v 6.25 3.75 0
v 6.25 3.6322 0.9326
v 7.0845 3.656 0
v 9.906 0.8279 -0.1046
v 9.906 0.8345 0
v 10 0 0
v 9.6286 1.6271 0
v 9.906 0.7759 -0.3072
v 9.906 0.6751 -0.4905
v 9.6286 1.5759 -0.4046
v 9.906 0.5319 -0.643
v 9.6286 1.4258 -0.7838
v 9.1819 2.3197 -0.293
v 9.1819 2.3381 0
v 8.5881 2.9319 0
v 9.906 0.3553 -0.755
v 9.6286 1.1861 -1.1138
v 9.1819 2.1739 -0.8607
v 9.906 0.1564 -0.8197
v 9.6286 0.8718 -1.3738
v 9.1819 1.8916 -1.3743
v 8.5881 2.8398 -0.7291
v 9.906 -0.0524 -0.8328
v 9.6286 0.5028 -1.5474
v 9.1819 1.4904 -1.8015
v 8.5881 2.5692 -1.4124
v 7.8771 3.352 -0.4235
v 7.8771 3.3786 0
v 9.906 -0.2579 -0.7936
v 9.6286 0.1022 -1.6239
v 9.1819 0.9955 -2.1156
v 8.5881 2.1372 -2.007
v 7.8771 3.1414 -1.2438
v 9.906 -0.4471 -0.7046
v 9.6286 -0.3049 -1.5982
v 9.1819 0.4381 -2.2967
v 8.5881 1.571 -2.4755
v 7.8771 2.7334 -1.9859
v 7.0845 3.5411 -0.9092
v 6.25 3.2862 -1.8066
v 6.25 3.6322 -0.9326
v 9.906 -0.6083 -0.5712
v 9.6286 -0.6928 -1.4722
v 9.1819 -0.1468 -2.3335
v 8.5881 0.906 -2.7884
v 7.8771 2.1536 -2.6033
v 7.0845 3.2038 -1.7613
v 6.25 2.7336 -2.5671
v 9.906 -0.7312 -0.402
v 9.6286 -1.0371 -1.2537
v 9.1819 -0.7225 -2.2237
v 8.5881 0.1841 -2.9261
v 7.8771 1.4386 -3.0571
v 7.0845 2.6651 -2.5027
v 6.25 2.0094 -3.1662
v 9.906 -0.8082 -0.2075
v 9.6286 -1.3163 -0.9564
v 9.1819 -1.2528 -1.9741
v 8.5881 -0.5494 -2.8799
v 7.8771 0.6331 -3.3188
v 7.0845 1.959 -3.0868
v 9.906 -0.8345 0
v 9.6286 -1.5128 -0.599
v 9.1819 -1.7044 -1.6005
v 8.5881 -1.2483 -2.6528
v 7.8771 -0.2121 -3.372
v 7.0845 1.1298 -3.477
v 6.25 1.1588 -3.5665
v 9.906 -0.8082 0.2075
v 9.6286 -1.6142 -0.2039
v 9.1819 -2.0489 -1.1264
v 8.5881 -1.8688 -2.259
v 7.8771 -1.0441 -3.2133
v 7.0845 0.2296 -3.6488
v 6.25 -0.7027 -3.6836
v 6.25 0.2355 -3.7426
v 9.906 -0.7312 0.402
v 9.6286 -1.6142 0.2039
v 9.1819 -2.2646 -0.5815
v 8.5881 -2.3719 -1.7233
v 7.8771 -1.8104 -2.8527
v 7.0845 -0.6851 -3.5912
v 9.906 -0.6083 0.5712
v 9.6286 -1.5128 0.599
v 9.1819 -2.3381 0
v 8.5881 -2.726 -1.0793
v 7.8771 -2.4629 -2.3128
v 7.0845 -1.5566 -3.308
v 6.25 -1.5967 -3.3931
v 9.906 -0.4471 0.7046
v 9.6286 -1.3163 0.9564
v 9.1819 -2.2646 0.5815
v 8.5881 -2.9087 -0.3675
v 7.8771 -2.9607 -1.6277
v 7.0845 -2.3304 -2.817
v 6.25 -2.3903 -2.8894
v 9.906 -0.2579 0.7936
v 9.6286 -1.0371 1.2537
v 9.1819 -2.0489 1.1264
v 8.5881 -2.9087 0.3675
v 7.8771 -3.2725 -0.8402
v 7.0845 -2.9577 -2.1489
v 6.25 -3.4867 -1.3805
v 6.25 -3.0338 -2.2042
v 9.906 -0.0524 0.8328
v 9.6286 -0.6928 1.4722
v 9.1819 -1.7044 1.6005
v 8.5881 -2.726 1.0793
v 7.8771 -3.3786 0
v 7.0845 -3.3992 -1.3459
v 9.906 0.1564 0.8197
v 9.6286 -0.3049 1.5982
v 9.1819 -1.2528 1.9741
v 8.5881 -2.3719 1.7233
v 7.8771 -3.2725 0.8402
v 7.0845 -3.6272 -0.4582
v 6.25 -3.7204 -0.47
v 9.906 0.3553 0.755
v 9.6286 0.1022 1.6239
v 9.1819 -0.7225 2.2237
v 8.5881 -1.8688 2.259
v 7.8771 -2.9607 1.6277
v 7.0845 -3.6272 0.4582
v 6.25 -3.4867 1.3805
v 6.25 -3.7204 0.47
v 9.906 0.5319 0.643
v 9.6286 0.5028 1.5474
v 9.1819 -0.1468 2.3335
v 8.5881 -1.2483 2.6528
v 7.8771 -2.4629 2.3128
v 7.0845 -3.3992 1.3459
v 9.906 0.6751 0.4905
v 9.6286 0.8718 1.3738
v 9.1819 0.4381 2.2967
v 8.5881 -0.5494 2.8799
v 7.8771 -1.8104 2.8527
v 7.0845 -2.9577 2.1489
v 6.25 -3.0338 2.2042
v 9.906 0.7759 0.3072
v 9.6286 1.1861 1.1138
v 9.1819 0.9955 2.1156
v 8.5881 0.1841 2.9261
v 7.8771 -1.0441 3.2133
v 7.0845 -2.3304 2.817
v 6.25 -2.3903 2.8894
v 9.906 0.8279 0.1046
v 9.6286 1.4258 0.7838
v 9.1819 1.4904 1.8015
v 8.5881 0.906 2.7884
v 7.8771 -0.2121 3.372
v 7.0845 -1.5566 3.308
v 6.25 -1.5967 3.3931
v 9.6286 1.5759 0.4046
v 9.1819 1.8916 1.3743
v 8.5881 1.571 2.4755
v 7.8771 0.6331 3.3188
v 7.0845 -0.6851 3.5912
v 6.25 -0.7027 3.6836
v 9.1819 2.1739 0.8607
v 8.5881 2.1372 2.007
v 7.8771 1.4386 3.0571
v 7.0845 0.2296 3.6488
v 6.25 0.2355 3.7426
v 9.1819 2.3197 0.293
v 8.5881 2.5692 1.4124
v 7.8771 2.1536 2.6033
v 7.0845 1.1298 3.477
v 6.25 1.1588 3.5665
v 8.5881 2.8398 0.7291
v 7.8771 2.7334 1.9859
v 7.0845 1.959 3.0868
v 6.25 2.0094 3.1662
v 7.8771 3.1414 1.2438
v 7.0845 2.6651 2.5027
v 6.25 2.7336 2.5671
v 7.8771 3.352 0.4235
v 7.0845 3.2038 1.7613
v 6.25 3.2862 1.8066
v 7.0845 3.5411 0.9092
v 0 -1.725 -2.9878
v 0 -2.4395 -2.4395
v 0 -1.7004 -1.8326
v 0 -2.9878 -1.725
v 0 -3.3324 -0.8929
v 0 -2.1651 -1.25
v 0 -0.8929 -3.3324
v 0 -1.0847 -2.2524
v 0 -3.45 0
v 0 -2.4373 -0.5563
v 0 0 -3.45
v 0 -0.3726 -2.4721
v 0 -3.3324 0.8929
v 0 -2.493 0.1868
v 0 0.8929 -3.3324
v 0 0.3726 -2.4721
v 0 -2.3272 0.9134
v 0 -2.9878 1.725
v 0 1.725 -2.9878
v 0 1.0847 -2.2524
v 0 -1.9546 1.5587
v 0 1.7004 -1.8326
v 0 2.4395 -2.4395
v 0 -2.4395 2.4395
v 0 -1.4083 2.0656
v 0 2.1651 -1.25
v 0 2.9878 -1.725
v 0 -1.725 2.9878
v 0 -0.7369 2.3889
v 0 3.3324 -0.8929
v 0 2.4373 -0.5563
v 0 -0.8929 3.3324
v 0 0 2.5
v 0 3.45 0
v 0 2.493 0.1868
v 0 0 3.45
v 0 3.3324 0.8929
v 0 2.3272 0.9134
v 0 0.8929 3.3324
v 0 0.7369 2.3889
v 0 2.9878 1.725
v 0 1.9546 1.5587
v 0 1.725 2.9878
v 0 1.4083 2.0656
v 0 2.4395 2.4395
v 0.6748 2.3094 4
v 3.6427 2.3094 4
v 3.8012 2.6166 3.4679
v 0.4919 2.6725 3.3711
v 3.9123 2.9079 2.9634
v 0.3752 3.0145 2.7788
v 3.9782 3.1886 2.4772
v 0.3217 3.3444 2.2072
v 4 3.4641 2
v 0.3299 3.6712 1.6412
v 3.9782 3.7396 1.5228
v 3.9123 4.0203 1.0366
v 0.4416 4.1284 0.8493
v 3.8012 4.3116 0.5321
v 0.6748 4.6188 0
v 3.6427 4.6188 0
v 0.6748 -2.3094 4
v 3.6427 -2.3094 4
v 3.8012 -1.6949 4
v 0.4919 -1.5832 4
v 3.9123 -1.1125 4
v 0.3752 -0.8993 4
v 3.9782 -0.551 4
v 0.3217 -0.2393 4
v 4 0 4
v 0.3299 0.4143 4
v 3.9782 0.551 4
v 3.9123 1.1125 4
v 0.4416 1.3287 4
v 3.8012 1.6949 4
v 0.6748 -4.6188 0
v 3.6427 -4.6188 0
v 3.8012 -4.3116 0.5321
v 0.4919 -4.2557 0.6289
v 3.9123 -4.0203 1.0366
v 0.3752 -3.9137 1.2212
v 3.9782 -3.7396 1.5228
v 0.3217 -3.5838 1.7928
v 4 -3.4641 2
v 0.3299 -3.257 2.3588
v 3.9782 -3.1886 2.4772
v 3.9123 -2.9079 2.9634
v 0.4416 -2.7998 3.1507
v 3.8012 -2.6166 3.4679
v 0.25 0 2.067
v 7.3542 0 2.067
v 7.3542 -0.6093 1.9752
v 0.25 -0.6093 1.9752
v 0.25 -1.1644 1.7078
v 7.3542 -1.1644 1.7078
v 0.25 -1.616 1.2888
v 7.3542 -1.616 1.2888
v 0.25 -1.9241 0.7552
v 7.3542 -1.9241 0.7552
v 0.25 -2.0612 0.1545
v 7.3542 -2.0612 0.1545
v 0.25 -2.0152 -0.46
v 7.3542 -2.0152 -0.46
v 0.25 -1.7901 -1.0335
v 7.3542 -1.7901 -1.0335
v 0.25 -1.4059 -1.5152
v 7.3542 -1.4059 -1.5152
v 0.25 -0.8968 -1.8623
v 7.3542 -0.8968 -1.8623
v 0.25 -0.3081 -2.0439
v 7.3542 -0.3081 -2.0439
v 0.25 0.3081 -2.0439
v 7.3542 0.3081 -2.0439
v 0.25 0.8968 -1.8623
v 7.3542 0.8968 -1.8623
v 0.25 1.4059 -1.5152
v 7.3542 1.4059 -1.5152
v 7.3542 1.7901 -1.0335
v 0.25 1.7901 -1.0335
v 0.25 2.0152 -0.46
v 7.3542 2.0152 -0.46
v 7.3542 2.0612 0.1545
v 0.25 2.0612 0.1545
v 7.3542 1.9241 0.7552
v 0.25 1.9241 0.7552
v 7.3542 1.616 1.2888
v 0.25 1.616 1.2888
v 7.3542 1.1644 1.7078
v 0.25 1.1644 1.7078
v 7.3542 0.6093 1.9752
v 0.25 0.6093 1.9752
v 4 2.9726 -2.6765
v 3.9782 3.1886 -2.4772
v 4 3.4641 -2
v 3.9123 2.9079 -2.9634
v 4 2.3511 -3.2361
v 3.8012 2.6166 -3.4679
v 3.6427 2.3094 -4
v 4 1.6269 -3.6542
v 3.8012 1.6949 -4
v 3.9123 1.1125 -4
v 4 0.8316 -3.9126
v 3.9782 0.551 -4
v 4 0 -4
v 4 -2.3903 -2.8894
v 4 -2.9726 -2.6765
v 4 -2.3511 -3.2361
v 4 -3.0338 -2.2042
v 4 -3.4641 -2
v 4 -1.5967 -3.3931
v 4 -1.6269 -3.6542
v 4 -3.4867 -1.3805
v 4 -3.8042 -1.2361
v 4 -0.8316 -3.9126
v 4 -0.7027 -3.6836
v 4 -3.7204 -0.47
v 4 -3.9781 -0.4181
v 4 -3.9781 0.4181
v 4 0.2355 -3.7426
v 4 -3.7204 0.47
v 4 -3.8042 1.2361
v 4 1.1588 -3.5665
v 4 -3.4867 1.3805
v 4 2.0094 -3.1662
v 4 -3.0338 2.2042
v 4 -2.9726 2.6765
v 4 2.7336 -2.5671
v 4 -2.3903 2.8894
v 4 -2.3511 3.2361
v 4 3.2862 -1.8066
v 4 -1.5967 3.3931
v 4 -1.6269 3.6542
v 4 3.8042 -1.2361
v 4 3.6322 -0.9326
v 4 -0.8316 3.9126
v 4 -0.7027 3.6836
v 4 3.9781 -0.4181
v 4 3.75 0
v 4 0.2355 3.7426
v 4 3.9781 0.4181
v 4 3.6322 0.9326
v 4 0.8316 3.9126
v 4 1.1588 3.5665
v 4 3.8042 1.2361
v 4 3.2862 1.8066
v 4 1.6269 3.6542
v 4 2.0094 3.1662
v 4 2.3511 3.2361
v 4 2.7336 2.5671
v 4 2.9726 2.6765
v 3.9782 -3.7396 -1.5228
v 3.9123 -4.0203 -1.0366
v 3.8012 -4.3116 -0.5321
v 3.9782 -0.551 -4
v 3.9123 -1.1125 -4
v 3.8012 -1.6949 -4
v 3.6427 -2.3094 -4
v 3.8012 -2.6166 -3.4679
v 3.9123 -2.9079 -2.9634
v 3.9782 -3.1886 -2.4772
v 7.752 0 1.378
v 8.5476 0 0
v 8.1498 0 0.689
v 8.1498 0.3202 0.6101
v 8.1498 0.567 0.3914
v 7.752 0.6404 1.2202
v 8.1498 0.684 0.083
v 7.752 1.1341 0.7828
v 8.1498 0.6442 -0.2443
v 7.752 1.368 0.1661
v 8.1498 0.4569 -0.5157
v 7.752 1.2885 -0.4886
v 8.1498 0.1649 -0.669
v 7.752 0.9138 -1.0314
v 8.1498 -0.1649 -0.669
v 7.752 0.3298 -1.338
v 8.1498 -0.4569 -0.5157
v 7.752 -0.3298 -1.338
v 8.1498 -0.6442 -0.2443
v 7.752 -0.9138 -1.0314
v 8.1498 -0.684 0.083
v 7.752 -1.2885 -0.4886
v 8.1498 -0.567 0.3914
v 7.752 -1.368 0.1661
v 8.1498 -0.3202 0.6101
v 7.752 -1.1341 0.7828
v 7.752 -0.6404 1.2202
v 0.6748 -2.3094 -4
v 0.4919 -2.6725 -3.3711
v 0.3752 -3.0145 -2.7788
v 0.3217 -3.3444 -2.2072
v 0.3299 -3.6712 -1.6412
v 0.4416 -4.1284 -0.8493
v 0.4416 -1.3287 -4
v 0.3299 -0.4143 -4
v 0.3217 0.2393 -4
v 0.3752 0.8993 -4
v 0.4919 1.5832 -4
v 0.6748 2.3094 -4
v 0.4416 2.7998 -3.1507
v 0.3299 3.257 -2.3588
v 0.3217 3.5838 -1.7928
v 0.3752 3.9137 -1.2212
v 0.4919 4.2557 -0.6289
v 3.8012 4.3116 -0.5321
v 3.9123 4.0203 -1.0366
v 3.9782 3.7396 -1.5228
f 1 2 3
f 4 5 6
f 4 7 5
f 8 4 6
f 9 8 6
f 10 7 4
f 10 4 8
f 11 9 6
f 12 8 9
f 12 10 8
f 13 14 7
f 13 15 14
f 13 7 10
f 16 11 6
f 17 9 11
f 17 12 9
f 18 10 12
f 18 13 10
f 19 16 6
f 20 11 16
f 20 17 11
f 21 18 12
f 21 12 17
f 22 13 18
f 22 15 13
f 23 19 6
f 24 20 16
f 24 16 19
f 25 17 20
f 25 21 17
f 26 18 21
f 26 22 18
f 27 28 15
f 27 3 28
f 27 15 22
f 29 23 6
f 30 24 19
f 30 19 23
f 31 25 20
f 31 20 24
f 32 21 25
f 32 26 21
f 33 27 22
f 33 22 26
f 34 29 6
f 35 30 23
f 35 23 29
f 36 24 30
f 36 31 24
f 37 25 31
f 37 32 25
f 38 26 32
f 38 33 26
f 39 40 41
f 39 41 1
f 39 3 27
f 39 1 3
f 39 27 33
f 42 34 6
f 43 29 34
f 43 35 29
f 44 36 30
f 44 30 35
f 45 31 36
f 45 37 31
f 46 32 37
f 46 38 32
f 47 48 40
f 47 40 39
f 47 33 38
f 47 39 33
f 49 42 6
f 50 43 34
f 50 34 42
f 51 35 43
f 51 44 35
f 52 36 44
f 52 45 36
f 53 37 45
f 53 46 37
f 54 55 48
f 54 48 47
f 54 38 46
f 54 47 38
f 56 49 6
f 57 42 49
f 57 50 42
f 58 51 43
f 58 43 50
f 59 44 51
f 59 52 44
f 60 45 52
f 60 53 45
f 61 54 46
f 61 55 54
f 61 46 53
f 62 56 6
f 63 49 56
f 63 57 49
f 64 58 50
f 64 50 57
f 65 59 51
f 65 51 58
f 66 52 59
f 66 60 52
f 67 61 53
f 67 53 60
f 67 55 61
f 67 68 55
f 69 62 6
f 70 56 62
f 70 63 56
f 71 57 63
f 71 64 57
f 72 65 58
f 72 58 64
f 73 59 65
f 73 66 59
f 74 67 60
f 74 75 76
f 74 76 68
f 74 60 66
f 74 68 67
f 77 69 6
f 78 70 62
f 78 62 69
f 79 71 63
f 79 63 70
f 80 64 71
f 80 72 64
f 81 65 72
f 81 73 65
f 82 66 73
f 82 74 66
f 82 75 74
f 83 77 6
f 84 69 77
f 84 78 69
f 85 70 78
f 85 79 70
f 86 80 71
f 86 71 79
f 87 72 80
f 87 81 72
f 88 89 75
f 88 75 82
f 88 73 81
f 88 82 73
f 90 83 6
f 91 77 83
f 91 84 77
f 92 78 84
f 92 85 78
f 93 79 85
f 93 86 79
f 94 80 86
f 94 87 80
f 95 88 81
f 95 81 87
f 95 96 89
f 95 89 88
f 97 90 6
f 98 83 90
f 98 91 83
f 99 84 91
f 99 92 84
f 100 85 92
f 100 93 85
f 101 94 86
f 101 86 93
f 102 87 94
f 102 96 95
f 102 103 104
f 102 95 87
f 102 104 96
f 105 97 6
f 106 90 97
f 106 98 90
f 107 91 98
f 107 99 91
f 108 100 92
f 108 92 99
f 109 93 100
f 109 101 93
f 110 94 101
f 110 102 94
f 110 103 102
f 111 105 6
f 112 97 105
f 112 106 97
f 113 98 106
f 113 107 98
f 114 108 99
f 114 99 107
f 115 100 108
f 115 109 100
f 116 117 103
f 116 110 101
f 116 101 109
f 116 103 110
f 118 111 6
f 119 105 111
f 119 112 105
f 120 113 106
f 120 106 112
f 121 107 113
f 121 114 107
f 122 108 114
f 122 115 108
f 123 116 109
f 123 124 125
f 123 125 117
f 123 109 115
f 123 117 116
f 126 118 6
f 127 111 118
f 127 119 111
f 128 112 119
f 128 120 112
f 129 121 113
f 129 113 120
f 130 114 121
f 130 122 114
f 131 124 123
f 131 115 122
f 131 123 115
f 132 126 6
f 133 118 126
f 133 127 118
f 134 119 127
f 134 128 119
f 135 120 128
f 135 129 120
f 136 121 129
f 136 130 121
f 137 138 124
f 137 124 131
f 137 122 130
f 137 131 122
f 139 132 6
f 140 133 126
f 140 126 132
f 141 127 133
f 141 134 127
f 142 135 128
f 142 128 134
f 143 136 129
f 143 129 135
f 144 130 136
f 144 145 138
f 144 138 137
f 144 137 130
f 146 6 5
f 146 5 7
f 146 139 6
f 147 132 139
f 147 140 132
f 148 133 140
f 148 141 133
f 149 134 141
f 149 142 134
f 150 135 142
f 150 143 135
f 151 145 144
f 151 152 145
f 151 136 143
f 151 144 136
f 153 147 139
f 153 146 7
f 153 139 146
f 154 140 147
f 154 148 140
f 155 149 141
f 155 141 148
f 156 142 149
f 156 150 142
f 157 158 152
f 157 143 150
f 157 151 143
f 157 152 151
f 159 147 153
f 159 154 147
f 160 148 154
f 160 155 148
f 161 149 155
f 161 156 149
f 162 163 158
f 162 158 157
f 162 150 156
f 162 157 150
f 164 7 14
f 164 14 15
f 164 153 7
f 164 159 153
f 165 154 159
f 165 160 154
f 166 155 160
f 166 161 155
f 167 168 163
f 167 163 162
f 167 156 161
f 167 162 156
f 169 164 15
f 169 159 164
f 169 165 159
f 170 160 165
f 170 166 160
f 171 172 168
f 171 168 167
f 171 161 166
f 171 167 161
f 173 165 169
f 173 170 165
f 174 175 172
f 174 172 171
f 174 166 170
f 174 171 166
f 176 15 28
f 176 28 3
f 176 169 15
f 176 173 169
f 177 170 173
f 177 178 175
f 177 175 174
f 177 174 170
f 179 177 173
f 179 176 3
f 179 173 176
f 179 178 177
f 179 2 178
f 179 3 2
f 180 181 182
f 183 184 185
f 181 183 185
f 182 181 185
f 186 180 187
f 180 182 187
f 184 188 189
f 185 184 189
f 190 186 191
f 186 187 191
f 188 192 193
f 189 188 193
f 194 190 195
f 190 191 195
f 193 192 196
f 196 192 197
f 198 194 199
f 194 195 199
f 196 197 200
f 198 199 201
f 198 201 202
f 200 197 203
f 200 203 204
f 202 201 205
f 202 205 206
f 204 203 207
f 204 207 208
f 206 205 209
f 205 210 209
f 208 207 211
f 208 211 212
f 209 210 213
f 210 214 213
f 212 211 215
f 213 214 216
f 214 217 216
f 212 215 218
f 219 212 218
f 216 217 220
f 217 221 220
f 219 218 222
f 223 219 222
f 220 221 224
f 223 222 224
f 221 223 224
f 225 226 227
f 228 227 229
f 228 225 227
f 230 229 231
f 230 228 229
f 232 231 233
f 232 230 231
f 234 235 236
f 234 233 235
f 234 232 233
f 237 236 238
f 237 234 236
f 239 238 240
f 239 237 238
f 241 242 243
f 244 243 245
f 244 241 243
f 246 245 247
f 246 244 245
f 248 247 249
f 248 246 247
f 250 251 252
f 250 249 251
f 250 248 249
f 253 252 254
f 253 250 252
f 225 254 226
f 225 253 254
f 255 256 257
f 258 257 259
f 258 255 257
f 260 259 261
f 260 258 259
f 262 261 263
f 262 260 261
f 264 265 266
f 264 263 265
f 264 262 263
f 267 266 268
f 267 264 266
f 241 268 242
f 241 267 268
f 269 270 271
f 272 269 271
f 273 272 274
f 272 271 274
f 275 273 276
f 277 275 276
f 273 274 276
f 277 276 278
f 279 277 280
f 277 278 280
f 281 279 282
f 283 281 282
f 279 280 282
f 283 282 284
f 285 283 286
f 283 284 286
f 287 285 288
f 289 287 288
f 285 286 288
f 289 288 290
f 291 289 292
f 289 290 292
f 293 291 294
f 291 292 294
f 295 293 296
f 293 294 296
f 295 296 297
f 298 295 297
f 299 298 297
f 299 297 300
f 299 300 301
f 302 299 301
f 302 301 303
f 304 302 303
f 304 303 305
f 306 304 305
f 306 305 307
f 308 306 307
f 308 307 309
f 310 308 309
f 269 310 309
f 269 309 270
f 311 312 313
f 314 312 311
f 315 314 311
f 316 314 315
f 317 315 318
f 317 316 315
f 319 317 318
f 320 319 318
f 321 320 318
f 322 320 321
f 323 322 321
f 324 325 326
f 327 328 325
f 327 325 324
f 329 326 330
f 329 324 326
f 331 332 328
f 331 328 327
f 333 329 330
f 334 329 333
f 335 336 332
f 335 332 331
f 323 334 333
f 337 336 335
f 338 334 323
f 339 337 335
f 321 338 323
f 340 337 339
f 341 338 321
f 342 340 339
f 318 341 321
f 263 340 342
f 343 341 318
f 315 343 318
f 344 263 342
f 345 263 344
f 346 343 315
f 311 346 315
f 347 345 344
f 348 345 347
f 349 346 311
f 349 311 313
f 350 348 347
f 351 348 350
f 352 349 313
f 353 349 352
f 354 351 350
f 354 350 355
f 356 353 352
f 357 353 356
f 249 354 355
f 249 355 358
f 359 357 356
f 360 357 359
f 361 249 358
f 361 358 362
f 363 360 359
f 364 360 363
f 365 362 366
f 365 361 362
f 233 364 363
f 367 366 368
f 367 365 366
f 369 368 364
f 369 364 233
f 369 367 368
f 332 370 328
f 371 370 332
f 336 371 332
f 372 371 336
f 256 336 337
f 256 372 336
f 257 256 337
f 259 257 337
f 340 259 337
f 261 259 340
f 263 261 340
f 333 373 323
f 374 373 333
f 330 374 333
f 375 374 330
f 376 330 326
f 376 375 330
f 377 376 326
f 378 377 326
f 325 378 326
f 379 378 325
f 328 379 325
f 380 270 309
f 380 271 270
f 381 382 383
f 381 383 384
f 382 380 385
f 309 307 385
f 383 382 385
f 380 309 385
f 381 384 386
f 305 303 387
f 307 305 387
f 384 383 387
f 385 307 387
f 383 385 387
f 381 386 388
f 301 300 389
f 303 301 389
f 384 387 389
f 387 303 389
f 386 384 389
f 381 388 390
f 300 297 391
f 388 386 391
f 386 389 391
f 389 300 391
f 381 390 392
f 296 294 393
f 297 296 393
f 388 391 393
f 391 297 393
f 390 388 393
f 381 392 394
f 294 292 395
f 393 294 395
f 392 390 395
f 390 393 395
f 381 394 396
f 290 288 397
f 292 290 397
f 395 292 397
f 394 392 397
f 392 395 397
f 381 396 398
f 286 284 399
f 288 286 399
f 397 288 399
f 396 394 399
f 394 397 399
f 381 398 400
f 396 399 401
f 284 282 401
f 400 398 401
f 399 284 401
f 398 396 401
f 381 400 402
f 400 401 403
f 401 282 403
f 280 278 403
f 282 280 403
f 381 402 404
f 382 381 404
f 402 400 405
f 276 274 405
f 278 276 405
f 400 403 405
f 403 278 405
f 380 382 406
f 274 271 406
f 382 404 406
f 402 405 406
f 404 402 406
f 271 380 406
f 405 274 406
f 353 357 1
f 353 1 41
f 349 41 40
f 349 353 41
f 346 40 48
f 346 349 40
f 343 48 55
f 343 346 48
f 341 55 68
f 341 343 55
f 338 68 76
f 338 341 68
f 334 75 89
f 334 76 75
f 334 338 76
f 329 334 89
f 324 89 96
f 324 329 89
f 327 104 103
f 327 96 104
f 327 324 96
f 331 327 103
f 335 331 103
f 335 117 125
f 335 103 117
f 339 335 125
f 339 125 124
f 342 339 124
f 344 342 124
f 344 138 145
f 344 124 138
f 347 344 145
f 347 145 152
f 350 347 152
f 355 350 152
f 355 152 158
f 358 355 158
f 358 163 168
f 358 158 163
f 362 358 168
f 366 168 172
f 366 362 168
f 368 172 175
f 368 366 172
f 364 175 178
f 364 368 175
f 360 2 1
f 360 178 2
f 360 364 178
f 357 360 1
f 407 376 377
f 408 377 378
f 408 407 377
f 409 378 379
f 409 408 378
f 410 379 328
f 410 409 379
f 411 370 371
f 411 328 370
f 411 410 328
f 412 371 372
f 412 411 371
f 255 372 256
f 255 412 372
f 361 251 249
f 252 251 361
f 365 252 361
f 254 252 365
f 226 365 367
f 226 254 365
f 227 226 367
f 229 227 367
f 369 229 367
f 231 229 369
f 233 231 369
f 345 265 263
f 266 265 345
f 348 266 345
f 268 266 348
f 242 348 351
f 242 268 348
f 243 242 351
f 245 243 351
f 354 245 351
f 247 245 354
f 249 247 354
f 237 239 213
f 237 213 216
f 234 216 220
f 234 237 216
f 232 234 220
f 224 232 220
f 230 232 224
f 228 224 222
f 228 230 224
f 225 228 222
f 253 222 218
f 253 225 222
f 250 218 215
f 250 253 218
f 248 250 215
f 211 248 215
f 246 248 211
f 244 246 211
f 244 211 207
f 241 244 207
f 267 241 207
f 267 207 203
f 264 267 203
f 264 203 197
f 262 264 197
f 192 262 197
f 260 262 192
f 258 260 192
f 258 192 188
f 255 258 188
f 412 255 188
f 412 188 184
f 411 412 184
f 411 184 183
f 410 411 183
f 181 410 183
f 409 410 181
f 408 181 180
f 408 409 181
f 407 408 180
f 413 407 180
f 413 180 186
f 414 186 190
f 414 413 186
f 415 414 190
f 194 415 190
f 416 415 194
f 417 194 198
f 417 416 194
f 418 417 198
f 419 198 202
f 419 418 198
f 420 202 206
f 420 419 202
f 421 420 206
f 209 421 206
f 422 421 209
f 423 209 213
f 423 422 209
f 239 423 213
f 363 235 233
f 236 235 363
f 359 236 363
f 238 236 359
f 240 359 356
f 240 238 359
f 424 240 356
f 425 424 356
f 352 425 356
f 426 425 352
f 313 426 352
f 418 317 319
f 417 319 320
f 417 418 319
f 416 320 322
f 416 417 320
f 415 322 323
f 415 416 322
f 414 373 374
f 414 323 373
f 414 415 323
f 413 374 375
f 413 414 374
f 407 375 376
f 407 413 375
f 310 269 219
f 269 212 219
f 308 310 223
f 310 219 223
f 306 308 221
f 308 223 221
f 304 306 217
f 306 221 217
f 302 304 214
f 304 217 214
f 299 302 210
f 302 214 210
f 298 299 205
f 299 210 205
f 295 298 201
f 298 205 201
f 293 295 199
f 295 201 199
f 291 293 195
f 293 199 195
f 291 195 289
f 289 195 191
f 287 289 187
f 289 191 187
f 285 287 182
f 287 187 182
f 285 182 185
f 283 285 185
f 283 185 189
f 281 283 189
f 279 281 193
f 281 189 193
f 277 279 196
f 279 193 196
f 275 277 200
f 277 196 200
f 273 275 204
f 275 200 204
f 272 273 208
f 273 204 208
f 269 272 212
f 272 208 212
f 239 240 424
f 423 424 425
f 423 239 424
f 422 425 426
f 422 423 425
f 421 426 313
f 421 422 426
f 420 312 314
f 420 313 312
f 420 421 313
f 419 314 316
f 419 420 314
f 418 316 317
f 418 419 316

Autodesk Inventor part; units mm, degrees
ref_plane "YZ Plane" through (0, 0, 0) normal (1, 0, 0) x (0, 1, 0)
ref_plane "XZ Plane" through (0, 0, 0) normal (0, 1, 0) x (-1, 0, 0)
sketch "Sketch1" plane through (0, 0, 0) normal (1, 0, 0) x (0, 1, 0)
  line L0 (-2.3094, -4) -> (-4.6188, 0)
  line L1 (-4.6188, 0) -> (-2.3094, 4)
  line L2 (-2.3094, 4) -> (2.3094, 4)
  line L3 (2.3094, 4) -> (4.6188, 0)
  line L4 (4.6188, 0) -> (2.3094, -4)
  line L5 (2.3094, -4) -> (-2.3094, -4)
  point P0 (0, 0)
  point P1 (0, 0)
  dimension "d0" = 9.2376
extrude "Body" add sketch "Sketch1" along normal blind 4
sketch "Sketch2" plane through (0, 0, 0) normal (0, 0, 1) x (1, 0, 0)
  line L0 (4, 0) -> (10, 0)
  arc A0 (10, 0) -> (6.25, 3.75) centre (6.25, 0) ccw
  line L1 (6.25, 3.75) -> (4, 3.75)
  line L2 (4, -2.3094) -> (4, 2.3094) projected
  line L3 (4, 0) -> (4, 3.75)
  line L4 (2.6447, 0) -> (12.132, 0) projected
  dimension "d8" = 3.75
  dimension "d9" = 6
revolve "Cap" add sketch "Sketch2" angle 360 about axis through (4, 0, 0) along (1, 0, 0)
sketch "Sketch3" plane through (0, 0, 0) normal (-1, 0, 0) x (0, 0, 1)
  line L0 (0, -6.4663) -> (0, 6.4663) projected
  line L1 (-5.6, 0) -> (5.6, 0) projected
  point P0 (0, 0)
hole "Thread" at (0, 0, 0) direction (1, 0, 0) diameter 4.134 depth 7.3542 tip angle 120 thread size "M5x0.8" class "6H" standard "ISO Metric profile"
sketch "Sketch4" plane through (0, 0, 0) normal (0, 0, 1) x (1, 0, 0)
  line L0 (0, 2.3094) -> (0, 4.6188) projected
  line L1 (0, 4.6188) -> (4, 4.6188) projected
  line L2 (4, 2.3094) -> (4, 4.6188) projected
  line L3 (-0.8, 0) -> (4.8, 0) projected
  line L4 (0.6748, 4.6188) -> (0, 3.45)
  line L5 (3.6427, 4.6188) -> (4, 4)
  dimension "d3" = 6.9
  dimension "d4" = 30
  dimension "d5" = 8
  dimension "d6" = 30
revolve "Chamfer1" cut sketch "Sketch4" angle 360 about axis through (-10, 0, 0) along (1, 0, 0)
chamfer "Chamfer2" distance 0.433 angle 30 1 edges at (0, 0, -2.067) measured on face at (0, 2.9506, -0.3583)
ref_plane "Work Plane1" through (3.6771, 0, 0) normal (0, 0.866, -0.5) x (-1, 0, 0)
equation "\"d0\" = 1.1547 * SW"
equation "\"d1\" = SIH"
equation "\"d8\" = KR"
equation "\"d9\" = KOH1 - SIH"
equation "\"d11\" = GEL"
equation "\"d12\" = 1.02 * GEL"
equation "\"d3\" = SW0"
equation "\"d4\" = ANG1"
equation "\"d5\" = SW01"
equation "\"d6\" = ANG2"
equation "\"d14\" = -0.5 * GD1 + 0.5 * NND"
equation "\"d36\" = -0.5 * GD1 + 0.5 * NND"
equation "\"ANG1\" = 30deg"
equation "\"ANG2\" = 30deg"
equation "\"NND\" = 5"
equation "\"SIH\" = 4"
equation "\"KOH1\" = 10"
equation "\"GEL\" = 7.21"
equation "\"SW\" = 8"
equation "\"KR\" = 3.75"
equation "\"SW0\" = 6.9"
equation "\"SW01\" = SW"
equation "\"GUL\" = 0.541266 * PTC"
equation "\"THREADDIA\" = 5"
equation "\"TOA\" = 30deg"
equation "\"PTC\" = 0.8"
equation "\"E0\" = 1.155 * SW"
equation "\"GAL\" = 0.541266 * PTC"
equation "\"GD1\" = 4.133975"
properties part number "DIN 1587 - M5" material "Steel, Mild"
